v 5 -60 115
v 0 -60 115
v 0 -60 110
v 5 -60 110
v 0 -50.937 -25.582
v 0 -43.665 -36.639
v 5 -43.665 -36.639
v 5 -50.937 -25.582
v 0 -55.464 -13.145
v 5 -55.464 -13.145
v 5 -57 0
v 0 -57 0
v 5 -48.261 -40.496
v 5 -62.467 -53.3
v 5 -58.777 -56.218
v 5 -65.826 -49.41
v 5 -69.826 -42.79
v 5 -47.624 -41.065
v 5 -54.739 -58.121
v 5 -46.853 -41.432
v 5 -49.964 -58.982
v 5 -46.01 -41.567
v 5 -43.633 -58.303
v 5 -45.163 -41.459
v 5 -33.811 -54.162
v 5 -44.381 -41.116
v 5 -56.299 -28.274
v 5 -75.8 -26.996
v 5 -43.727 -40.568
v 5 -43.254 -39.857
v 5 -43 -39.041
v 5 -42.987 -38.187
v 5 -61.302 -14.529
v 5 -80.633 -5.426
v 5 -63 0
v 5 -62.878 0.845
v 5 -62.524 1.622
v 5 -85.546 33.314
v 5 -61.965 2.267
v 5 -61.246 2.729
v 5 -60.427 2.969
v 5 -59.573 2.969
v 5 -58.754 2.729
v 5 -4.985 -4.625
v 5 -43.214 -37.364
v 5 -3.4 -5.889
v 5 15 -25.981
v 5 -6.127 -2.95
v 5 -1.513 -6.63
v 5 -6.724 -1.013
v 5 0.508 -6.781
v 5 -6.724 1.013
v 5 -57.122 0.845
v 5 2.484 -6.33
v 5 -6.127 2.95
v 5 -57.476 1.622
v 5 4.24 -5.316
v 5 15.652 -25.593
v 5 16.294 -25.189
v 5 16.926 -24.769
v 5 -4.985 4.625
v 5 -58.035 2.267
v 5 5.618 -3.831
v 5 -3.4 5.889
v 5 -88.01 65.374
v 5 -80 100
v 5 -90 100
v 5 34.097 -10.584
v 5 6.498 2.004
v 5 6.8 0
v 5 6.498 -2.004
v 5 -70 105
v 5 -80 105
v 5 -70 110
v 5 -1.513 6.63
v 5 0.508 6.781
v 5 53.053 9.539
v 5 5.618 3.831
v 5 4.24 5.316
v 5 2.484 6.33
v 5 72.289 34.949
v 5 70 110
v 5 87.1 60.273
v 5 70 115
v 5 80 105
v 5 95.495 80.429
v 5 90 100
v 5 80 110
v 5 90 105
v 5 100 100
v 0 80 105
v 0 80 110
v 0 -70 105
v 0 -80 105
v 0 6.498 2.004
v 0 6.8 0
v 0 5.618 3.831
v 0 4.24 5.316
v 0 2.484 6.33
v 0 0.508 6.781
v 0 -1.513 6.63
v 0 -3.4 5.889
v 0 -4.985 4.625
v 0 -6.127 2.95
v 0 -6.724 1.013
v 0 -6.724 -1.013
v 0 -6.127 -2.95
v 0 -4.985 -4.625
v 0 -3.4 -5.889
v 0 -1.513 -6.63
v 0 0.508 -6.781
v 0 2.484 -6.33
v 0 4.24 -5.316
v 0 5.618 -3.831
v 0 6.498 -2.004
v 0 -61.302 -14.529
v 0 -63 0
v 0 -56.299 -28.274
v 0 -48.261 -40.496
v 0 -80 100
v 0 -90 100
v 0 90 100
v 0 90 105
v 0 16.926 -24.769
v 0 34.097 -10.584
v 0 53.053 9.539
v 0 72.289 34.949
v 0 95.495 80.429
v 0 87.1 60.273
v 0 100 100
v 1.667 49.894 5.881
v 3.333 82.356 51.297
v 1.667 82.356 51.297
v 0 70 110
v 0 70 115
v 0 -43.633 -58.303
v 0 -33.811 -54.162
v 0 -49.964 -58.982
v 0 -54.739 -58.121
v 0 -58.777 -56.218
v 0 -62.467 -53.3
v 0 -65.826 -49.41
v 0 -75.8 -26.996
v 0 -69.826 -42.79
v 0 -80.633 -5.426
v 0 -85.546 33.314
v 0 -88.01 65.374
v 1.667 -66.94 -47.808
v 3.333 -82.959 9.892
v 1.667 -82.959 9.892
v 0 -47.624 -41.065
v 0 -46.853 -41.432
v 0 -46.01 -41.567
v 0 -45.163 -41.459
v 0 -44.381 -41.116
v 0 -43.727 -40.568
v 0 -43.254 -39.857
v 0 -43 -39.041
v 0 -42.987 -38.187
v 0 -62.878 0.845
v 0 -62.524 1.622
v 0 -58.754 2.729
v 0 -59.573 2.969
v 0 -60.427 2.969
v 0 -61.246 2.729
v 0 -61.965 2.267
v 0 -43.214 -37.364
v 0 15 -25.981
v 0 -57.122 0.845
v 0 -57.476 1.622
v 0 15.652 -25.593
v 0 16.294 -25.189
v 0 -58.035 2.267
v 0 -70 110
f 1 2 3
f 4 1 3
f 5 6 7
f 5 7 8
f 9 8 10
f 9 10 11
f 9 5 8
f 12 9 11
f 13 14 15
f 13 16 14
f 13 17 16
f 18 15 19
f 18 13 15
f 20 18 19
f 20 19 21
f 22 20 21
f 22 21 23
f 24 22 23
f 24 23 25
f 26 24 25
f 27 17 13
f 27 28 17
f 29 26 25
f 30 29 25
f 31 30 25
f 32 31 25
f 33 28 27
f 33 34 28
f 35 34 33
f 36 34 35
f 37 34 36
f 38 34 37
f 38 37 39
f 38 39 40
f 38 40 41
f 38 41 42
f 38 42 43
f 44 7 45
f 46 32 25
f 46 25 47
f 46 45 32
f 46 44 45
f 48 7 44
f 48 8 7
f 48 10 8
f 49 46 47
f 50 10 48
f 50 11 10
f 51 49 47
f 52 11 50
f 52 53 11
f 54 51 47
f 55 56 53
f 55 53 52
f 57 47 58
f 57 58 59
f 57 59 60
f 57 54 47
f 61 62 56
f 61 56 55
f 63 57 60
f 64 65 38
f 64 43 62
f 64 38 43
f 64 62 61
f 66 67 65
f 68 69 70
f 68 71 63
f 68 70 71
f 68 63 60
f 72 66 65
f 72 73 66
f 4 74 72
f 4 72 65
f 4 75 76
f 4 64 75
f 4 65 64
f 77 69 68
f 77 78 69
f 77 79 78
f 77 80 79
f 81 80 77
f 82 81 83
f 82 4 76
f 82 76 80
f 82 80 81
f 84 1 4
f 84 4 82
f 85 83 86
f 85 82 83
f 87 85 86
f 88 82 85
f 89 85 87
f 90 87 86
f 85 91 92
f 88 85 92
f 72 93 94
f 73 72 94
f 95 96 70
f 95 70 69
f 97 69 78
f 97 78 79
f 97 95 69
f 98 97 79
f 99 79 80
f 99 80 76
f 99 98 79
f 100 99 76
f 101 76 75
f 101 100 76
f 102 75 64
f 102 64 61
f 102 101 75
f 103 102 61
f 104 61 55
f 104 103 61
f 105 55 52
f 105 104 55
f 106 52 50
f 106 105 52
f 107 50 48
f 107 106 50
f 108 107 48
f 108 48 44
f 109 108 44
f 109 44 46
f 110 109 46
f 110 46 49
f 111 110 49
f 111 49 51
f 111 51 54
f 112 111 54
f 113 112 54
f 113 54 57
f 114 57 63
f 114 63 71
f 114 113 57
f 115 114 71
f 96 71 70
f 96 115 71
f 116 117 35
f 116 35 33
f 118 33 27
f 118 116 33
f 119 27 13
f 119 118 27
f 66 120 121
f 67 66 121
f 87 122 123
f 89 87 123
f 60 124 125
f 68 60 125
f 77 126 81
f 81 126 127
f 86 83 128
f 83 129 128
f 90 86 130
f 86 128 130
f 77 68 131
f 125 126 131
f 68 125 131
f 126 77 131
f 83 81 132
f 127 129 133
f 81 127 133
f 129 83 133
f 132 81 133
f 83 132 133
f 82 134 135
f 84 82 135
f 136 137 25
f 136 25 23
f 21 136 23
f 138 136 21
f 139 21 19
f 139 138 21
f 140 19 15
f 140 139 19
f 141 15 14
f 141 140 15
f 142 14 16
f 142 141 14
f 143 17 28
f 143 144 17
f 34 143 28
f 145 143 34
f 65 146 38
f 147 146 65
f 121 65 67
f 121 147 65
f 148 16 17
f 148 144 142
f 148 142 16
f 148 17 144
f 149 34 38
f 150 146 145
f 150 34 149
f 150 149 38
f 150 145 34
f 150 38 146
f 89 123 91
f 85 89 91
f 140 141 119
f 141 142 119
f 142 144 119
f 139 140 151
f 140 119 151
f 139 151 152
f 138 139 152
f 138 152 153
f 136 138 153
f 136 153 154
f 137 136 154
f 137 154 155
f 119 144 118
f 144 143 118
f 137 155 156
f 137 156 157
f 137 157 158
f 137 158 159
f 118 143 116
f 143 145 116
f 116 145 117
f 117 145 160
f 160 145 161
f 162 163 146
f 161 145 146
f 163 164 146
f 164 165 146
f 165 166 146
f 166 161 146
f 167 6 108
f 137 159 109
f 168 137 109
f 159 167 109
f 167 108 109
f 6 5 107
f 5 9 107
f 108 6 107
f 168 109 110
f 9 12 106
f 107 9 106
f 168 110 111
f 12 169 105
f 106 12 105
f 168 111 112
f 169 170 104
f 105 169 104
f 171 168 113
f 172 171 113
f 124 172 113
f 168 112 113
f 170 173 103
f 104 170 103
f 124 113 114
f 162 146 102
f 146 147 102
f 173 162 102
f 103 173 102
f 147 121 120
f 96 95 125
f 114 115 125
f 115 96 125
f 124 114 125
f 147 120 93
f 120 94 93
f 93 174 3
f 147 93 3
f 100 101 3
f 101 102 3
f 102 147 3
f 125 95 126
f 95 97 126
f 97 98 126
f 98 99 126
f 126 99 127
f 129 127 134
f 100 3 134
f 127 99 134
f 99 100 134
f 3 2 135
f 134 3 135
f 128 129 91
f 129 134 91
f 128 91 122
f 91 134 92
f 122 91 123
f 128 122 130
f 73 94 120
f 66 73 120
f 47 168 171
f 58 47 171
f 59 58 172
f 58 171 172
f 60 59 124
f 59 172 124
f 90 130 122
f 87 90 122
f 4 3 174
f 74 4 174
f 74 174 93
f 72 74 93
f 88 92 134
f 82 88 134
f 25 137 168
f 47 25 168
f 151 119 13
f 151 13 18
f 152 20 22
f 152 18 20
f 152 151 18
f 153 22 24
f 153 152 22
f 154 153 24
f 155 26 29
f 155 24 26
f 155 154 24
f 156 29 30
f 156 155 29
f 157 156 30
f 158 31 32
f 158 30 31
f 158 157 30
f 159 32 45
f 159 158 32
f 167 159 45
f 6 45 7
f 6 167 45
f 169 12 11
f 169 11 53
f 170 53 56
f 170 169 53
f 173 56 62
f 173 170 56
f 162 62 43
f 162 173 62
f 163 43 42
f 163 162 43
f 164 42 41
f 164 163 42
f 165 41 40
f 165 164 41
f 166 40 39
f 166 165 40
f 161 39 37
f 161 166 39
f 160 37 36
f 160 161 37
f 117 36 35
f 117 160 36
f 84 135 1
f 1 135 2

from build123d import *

# Parameters (mm, degrees)
F0_R     = 6.8
F3_DEPTH = 5
F4_DEPTH = 5.001
F5_DEPTH = 5


with BuildPart() as f3:
    # F0 (on Right) → F3 (new body)
    with BuildSketch(Plane.YZ):
        with BuildLine():
            ThreePointArc((15, -25.980762), (15.974572, -25.393169), (16.926158, -24.769037))
            add(Edge.make_bspline(
                [(16.926158, -24.769037), (45.375206, -5.328108), (94.536945, 53.480837), (100, 100)],
                knots=[0, 0, 0, 0, 149.895216, 149.895216, 149.895216, 149.895216], degree=3))
            Line((100, 100), (-90, 100))
            add(Edge.make_bspline(
                [(-33.810598, -54.161574), (-78.207154, -79.793938), (-84.736958, 0), (-90, 100)],
                knots=[0, 0, 0, 0, 164.082418, 164.082418, 164.082418, 164.082418], degree=3))
            Line((-33.810598, -54.161574), (15, -25.980762))
        make_face()
        Circle(F0_R, mode=Mode.SUBTRACT)
    extrude(amount=F3_DEPTH)

    # F1 (on Right) → F4 (cut, through all)
    with BuildSketch(Plane.YZ):
        with BuildLine():
            ThreePointArc((-57, 0), (-60, 3), (-63, 0))
            ThreePointArc((-63, 0), (-59.200635, -21.547269), (-48.2608, -40.495619))
            ThreePointArc((-48.2608, -40.495619), (-44.034304, -40.86539), (-43.664533, -36.638894))
            ThreePointArc((-43.664533, -36.638894), (-53.562479, -19.495148), (-57, 0))
        make_face()
    extrude(amount=F4_DEPTH, mode=Mode.SUBTRACT)

    # F2 (on Right) → F5 (join)
    with BuildSketch(Plane.YZ):
        Polygon((-80, 105), (-80, 100), (90, 100), (90, 105), (80, 105), (80, 110), (70, 110), (70, 115), (60, 115), (-50, 115), (-60, 115), (-60, 110), (-70, 110), (-70, 105), align=None)
    extrude(amount=F5_DEPTH)


solid = f3.part
